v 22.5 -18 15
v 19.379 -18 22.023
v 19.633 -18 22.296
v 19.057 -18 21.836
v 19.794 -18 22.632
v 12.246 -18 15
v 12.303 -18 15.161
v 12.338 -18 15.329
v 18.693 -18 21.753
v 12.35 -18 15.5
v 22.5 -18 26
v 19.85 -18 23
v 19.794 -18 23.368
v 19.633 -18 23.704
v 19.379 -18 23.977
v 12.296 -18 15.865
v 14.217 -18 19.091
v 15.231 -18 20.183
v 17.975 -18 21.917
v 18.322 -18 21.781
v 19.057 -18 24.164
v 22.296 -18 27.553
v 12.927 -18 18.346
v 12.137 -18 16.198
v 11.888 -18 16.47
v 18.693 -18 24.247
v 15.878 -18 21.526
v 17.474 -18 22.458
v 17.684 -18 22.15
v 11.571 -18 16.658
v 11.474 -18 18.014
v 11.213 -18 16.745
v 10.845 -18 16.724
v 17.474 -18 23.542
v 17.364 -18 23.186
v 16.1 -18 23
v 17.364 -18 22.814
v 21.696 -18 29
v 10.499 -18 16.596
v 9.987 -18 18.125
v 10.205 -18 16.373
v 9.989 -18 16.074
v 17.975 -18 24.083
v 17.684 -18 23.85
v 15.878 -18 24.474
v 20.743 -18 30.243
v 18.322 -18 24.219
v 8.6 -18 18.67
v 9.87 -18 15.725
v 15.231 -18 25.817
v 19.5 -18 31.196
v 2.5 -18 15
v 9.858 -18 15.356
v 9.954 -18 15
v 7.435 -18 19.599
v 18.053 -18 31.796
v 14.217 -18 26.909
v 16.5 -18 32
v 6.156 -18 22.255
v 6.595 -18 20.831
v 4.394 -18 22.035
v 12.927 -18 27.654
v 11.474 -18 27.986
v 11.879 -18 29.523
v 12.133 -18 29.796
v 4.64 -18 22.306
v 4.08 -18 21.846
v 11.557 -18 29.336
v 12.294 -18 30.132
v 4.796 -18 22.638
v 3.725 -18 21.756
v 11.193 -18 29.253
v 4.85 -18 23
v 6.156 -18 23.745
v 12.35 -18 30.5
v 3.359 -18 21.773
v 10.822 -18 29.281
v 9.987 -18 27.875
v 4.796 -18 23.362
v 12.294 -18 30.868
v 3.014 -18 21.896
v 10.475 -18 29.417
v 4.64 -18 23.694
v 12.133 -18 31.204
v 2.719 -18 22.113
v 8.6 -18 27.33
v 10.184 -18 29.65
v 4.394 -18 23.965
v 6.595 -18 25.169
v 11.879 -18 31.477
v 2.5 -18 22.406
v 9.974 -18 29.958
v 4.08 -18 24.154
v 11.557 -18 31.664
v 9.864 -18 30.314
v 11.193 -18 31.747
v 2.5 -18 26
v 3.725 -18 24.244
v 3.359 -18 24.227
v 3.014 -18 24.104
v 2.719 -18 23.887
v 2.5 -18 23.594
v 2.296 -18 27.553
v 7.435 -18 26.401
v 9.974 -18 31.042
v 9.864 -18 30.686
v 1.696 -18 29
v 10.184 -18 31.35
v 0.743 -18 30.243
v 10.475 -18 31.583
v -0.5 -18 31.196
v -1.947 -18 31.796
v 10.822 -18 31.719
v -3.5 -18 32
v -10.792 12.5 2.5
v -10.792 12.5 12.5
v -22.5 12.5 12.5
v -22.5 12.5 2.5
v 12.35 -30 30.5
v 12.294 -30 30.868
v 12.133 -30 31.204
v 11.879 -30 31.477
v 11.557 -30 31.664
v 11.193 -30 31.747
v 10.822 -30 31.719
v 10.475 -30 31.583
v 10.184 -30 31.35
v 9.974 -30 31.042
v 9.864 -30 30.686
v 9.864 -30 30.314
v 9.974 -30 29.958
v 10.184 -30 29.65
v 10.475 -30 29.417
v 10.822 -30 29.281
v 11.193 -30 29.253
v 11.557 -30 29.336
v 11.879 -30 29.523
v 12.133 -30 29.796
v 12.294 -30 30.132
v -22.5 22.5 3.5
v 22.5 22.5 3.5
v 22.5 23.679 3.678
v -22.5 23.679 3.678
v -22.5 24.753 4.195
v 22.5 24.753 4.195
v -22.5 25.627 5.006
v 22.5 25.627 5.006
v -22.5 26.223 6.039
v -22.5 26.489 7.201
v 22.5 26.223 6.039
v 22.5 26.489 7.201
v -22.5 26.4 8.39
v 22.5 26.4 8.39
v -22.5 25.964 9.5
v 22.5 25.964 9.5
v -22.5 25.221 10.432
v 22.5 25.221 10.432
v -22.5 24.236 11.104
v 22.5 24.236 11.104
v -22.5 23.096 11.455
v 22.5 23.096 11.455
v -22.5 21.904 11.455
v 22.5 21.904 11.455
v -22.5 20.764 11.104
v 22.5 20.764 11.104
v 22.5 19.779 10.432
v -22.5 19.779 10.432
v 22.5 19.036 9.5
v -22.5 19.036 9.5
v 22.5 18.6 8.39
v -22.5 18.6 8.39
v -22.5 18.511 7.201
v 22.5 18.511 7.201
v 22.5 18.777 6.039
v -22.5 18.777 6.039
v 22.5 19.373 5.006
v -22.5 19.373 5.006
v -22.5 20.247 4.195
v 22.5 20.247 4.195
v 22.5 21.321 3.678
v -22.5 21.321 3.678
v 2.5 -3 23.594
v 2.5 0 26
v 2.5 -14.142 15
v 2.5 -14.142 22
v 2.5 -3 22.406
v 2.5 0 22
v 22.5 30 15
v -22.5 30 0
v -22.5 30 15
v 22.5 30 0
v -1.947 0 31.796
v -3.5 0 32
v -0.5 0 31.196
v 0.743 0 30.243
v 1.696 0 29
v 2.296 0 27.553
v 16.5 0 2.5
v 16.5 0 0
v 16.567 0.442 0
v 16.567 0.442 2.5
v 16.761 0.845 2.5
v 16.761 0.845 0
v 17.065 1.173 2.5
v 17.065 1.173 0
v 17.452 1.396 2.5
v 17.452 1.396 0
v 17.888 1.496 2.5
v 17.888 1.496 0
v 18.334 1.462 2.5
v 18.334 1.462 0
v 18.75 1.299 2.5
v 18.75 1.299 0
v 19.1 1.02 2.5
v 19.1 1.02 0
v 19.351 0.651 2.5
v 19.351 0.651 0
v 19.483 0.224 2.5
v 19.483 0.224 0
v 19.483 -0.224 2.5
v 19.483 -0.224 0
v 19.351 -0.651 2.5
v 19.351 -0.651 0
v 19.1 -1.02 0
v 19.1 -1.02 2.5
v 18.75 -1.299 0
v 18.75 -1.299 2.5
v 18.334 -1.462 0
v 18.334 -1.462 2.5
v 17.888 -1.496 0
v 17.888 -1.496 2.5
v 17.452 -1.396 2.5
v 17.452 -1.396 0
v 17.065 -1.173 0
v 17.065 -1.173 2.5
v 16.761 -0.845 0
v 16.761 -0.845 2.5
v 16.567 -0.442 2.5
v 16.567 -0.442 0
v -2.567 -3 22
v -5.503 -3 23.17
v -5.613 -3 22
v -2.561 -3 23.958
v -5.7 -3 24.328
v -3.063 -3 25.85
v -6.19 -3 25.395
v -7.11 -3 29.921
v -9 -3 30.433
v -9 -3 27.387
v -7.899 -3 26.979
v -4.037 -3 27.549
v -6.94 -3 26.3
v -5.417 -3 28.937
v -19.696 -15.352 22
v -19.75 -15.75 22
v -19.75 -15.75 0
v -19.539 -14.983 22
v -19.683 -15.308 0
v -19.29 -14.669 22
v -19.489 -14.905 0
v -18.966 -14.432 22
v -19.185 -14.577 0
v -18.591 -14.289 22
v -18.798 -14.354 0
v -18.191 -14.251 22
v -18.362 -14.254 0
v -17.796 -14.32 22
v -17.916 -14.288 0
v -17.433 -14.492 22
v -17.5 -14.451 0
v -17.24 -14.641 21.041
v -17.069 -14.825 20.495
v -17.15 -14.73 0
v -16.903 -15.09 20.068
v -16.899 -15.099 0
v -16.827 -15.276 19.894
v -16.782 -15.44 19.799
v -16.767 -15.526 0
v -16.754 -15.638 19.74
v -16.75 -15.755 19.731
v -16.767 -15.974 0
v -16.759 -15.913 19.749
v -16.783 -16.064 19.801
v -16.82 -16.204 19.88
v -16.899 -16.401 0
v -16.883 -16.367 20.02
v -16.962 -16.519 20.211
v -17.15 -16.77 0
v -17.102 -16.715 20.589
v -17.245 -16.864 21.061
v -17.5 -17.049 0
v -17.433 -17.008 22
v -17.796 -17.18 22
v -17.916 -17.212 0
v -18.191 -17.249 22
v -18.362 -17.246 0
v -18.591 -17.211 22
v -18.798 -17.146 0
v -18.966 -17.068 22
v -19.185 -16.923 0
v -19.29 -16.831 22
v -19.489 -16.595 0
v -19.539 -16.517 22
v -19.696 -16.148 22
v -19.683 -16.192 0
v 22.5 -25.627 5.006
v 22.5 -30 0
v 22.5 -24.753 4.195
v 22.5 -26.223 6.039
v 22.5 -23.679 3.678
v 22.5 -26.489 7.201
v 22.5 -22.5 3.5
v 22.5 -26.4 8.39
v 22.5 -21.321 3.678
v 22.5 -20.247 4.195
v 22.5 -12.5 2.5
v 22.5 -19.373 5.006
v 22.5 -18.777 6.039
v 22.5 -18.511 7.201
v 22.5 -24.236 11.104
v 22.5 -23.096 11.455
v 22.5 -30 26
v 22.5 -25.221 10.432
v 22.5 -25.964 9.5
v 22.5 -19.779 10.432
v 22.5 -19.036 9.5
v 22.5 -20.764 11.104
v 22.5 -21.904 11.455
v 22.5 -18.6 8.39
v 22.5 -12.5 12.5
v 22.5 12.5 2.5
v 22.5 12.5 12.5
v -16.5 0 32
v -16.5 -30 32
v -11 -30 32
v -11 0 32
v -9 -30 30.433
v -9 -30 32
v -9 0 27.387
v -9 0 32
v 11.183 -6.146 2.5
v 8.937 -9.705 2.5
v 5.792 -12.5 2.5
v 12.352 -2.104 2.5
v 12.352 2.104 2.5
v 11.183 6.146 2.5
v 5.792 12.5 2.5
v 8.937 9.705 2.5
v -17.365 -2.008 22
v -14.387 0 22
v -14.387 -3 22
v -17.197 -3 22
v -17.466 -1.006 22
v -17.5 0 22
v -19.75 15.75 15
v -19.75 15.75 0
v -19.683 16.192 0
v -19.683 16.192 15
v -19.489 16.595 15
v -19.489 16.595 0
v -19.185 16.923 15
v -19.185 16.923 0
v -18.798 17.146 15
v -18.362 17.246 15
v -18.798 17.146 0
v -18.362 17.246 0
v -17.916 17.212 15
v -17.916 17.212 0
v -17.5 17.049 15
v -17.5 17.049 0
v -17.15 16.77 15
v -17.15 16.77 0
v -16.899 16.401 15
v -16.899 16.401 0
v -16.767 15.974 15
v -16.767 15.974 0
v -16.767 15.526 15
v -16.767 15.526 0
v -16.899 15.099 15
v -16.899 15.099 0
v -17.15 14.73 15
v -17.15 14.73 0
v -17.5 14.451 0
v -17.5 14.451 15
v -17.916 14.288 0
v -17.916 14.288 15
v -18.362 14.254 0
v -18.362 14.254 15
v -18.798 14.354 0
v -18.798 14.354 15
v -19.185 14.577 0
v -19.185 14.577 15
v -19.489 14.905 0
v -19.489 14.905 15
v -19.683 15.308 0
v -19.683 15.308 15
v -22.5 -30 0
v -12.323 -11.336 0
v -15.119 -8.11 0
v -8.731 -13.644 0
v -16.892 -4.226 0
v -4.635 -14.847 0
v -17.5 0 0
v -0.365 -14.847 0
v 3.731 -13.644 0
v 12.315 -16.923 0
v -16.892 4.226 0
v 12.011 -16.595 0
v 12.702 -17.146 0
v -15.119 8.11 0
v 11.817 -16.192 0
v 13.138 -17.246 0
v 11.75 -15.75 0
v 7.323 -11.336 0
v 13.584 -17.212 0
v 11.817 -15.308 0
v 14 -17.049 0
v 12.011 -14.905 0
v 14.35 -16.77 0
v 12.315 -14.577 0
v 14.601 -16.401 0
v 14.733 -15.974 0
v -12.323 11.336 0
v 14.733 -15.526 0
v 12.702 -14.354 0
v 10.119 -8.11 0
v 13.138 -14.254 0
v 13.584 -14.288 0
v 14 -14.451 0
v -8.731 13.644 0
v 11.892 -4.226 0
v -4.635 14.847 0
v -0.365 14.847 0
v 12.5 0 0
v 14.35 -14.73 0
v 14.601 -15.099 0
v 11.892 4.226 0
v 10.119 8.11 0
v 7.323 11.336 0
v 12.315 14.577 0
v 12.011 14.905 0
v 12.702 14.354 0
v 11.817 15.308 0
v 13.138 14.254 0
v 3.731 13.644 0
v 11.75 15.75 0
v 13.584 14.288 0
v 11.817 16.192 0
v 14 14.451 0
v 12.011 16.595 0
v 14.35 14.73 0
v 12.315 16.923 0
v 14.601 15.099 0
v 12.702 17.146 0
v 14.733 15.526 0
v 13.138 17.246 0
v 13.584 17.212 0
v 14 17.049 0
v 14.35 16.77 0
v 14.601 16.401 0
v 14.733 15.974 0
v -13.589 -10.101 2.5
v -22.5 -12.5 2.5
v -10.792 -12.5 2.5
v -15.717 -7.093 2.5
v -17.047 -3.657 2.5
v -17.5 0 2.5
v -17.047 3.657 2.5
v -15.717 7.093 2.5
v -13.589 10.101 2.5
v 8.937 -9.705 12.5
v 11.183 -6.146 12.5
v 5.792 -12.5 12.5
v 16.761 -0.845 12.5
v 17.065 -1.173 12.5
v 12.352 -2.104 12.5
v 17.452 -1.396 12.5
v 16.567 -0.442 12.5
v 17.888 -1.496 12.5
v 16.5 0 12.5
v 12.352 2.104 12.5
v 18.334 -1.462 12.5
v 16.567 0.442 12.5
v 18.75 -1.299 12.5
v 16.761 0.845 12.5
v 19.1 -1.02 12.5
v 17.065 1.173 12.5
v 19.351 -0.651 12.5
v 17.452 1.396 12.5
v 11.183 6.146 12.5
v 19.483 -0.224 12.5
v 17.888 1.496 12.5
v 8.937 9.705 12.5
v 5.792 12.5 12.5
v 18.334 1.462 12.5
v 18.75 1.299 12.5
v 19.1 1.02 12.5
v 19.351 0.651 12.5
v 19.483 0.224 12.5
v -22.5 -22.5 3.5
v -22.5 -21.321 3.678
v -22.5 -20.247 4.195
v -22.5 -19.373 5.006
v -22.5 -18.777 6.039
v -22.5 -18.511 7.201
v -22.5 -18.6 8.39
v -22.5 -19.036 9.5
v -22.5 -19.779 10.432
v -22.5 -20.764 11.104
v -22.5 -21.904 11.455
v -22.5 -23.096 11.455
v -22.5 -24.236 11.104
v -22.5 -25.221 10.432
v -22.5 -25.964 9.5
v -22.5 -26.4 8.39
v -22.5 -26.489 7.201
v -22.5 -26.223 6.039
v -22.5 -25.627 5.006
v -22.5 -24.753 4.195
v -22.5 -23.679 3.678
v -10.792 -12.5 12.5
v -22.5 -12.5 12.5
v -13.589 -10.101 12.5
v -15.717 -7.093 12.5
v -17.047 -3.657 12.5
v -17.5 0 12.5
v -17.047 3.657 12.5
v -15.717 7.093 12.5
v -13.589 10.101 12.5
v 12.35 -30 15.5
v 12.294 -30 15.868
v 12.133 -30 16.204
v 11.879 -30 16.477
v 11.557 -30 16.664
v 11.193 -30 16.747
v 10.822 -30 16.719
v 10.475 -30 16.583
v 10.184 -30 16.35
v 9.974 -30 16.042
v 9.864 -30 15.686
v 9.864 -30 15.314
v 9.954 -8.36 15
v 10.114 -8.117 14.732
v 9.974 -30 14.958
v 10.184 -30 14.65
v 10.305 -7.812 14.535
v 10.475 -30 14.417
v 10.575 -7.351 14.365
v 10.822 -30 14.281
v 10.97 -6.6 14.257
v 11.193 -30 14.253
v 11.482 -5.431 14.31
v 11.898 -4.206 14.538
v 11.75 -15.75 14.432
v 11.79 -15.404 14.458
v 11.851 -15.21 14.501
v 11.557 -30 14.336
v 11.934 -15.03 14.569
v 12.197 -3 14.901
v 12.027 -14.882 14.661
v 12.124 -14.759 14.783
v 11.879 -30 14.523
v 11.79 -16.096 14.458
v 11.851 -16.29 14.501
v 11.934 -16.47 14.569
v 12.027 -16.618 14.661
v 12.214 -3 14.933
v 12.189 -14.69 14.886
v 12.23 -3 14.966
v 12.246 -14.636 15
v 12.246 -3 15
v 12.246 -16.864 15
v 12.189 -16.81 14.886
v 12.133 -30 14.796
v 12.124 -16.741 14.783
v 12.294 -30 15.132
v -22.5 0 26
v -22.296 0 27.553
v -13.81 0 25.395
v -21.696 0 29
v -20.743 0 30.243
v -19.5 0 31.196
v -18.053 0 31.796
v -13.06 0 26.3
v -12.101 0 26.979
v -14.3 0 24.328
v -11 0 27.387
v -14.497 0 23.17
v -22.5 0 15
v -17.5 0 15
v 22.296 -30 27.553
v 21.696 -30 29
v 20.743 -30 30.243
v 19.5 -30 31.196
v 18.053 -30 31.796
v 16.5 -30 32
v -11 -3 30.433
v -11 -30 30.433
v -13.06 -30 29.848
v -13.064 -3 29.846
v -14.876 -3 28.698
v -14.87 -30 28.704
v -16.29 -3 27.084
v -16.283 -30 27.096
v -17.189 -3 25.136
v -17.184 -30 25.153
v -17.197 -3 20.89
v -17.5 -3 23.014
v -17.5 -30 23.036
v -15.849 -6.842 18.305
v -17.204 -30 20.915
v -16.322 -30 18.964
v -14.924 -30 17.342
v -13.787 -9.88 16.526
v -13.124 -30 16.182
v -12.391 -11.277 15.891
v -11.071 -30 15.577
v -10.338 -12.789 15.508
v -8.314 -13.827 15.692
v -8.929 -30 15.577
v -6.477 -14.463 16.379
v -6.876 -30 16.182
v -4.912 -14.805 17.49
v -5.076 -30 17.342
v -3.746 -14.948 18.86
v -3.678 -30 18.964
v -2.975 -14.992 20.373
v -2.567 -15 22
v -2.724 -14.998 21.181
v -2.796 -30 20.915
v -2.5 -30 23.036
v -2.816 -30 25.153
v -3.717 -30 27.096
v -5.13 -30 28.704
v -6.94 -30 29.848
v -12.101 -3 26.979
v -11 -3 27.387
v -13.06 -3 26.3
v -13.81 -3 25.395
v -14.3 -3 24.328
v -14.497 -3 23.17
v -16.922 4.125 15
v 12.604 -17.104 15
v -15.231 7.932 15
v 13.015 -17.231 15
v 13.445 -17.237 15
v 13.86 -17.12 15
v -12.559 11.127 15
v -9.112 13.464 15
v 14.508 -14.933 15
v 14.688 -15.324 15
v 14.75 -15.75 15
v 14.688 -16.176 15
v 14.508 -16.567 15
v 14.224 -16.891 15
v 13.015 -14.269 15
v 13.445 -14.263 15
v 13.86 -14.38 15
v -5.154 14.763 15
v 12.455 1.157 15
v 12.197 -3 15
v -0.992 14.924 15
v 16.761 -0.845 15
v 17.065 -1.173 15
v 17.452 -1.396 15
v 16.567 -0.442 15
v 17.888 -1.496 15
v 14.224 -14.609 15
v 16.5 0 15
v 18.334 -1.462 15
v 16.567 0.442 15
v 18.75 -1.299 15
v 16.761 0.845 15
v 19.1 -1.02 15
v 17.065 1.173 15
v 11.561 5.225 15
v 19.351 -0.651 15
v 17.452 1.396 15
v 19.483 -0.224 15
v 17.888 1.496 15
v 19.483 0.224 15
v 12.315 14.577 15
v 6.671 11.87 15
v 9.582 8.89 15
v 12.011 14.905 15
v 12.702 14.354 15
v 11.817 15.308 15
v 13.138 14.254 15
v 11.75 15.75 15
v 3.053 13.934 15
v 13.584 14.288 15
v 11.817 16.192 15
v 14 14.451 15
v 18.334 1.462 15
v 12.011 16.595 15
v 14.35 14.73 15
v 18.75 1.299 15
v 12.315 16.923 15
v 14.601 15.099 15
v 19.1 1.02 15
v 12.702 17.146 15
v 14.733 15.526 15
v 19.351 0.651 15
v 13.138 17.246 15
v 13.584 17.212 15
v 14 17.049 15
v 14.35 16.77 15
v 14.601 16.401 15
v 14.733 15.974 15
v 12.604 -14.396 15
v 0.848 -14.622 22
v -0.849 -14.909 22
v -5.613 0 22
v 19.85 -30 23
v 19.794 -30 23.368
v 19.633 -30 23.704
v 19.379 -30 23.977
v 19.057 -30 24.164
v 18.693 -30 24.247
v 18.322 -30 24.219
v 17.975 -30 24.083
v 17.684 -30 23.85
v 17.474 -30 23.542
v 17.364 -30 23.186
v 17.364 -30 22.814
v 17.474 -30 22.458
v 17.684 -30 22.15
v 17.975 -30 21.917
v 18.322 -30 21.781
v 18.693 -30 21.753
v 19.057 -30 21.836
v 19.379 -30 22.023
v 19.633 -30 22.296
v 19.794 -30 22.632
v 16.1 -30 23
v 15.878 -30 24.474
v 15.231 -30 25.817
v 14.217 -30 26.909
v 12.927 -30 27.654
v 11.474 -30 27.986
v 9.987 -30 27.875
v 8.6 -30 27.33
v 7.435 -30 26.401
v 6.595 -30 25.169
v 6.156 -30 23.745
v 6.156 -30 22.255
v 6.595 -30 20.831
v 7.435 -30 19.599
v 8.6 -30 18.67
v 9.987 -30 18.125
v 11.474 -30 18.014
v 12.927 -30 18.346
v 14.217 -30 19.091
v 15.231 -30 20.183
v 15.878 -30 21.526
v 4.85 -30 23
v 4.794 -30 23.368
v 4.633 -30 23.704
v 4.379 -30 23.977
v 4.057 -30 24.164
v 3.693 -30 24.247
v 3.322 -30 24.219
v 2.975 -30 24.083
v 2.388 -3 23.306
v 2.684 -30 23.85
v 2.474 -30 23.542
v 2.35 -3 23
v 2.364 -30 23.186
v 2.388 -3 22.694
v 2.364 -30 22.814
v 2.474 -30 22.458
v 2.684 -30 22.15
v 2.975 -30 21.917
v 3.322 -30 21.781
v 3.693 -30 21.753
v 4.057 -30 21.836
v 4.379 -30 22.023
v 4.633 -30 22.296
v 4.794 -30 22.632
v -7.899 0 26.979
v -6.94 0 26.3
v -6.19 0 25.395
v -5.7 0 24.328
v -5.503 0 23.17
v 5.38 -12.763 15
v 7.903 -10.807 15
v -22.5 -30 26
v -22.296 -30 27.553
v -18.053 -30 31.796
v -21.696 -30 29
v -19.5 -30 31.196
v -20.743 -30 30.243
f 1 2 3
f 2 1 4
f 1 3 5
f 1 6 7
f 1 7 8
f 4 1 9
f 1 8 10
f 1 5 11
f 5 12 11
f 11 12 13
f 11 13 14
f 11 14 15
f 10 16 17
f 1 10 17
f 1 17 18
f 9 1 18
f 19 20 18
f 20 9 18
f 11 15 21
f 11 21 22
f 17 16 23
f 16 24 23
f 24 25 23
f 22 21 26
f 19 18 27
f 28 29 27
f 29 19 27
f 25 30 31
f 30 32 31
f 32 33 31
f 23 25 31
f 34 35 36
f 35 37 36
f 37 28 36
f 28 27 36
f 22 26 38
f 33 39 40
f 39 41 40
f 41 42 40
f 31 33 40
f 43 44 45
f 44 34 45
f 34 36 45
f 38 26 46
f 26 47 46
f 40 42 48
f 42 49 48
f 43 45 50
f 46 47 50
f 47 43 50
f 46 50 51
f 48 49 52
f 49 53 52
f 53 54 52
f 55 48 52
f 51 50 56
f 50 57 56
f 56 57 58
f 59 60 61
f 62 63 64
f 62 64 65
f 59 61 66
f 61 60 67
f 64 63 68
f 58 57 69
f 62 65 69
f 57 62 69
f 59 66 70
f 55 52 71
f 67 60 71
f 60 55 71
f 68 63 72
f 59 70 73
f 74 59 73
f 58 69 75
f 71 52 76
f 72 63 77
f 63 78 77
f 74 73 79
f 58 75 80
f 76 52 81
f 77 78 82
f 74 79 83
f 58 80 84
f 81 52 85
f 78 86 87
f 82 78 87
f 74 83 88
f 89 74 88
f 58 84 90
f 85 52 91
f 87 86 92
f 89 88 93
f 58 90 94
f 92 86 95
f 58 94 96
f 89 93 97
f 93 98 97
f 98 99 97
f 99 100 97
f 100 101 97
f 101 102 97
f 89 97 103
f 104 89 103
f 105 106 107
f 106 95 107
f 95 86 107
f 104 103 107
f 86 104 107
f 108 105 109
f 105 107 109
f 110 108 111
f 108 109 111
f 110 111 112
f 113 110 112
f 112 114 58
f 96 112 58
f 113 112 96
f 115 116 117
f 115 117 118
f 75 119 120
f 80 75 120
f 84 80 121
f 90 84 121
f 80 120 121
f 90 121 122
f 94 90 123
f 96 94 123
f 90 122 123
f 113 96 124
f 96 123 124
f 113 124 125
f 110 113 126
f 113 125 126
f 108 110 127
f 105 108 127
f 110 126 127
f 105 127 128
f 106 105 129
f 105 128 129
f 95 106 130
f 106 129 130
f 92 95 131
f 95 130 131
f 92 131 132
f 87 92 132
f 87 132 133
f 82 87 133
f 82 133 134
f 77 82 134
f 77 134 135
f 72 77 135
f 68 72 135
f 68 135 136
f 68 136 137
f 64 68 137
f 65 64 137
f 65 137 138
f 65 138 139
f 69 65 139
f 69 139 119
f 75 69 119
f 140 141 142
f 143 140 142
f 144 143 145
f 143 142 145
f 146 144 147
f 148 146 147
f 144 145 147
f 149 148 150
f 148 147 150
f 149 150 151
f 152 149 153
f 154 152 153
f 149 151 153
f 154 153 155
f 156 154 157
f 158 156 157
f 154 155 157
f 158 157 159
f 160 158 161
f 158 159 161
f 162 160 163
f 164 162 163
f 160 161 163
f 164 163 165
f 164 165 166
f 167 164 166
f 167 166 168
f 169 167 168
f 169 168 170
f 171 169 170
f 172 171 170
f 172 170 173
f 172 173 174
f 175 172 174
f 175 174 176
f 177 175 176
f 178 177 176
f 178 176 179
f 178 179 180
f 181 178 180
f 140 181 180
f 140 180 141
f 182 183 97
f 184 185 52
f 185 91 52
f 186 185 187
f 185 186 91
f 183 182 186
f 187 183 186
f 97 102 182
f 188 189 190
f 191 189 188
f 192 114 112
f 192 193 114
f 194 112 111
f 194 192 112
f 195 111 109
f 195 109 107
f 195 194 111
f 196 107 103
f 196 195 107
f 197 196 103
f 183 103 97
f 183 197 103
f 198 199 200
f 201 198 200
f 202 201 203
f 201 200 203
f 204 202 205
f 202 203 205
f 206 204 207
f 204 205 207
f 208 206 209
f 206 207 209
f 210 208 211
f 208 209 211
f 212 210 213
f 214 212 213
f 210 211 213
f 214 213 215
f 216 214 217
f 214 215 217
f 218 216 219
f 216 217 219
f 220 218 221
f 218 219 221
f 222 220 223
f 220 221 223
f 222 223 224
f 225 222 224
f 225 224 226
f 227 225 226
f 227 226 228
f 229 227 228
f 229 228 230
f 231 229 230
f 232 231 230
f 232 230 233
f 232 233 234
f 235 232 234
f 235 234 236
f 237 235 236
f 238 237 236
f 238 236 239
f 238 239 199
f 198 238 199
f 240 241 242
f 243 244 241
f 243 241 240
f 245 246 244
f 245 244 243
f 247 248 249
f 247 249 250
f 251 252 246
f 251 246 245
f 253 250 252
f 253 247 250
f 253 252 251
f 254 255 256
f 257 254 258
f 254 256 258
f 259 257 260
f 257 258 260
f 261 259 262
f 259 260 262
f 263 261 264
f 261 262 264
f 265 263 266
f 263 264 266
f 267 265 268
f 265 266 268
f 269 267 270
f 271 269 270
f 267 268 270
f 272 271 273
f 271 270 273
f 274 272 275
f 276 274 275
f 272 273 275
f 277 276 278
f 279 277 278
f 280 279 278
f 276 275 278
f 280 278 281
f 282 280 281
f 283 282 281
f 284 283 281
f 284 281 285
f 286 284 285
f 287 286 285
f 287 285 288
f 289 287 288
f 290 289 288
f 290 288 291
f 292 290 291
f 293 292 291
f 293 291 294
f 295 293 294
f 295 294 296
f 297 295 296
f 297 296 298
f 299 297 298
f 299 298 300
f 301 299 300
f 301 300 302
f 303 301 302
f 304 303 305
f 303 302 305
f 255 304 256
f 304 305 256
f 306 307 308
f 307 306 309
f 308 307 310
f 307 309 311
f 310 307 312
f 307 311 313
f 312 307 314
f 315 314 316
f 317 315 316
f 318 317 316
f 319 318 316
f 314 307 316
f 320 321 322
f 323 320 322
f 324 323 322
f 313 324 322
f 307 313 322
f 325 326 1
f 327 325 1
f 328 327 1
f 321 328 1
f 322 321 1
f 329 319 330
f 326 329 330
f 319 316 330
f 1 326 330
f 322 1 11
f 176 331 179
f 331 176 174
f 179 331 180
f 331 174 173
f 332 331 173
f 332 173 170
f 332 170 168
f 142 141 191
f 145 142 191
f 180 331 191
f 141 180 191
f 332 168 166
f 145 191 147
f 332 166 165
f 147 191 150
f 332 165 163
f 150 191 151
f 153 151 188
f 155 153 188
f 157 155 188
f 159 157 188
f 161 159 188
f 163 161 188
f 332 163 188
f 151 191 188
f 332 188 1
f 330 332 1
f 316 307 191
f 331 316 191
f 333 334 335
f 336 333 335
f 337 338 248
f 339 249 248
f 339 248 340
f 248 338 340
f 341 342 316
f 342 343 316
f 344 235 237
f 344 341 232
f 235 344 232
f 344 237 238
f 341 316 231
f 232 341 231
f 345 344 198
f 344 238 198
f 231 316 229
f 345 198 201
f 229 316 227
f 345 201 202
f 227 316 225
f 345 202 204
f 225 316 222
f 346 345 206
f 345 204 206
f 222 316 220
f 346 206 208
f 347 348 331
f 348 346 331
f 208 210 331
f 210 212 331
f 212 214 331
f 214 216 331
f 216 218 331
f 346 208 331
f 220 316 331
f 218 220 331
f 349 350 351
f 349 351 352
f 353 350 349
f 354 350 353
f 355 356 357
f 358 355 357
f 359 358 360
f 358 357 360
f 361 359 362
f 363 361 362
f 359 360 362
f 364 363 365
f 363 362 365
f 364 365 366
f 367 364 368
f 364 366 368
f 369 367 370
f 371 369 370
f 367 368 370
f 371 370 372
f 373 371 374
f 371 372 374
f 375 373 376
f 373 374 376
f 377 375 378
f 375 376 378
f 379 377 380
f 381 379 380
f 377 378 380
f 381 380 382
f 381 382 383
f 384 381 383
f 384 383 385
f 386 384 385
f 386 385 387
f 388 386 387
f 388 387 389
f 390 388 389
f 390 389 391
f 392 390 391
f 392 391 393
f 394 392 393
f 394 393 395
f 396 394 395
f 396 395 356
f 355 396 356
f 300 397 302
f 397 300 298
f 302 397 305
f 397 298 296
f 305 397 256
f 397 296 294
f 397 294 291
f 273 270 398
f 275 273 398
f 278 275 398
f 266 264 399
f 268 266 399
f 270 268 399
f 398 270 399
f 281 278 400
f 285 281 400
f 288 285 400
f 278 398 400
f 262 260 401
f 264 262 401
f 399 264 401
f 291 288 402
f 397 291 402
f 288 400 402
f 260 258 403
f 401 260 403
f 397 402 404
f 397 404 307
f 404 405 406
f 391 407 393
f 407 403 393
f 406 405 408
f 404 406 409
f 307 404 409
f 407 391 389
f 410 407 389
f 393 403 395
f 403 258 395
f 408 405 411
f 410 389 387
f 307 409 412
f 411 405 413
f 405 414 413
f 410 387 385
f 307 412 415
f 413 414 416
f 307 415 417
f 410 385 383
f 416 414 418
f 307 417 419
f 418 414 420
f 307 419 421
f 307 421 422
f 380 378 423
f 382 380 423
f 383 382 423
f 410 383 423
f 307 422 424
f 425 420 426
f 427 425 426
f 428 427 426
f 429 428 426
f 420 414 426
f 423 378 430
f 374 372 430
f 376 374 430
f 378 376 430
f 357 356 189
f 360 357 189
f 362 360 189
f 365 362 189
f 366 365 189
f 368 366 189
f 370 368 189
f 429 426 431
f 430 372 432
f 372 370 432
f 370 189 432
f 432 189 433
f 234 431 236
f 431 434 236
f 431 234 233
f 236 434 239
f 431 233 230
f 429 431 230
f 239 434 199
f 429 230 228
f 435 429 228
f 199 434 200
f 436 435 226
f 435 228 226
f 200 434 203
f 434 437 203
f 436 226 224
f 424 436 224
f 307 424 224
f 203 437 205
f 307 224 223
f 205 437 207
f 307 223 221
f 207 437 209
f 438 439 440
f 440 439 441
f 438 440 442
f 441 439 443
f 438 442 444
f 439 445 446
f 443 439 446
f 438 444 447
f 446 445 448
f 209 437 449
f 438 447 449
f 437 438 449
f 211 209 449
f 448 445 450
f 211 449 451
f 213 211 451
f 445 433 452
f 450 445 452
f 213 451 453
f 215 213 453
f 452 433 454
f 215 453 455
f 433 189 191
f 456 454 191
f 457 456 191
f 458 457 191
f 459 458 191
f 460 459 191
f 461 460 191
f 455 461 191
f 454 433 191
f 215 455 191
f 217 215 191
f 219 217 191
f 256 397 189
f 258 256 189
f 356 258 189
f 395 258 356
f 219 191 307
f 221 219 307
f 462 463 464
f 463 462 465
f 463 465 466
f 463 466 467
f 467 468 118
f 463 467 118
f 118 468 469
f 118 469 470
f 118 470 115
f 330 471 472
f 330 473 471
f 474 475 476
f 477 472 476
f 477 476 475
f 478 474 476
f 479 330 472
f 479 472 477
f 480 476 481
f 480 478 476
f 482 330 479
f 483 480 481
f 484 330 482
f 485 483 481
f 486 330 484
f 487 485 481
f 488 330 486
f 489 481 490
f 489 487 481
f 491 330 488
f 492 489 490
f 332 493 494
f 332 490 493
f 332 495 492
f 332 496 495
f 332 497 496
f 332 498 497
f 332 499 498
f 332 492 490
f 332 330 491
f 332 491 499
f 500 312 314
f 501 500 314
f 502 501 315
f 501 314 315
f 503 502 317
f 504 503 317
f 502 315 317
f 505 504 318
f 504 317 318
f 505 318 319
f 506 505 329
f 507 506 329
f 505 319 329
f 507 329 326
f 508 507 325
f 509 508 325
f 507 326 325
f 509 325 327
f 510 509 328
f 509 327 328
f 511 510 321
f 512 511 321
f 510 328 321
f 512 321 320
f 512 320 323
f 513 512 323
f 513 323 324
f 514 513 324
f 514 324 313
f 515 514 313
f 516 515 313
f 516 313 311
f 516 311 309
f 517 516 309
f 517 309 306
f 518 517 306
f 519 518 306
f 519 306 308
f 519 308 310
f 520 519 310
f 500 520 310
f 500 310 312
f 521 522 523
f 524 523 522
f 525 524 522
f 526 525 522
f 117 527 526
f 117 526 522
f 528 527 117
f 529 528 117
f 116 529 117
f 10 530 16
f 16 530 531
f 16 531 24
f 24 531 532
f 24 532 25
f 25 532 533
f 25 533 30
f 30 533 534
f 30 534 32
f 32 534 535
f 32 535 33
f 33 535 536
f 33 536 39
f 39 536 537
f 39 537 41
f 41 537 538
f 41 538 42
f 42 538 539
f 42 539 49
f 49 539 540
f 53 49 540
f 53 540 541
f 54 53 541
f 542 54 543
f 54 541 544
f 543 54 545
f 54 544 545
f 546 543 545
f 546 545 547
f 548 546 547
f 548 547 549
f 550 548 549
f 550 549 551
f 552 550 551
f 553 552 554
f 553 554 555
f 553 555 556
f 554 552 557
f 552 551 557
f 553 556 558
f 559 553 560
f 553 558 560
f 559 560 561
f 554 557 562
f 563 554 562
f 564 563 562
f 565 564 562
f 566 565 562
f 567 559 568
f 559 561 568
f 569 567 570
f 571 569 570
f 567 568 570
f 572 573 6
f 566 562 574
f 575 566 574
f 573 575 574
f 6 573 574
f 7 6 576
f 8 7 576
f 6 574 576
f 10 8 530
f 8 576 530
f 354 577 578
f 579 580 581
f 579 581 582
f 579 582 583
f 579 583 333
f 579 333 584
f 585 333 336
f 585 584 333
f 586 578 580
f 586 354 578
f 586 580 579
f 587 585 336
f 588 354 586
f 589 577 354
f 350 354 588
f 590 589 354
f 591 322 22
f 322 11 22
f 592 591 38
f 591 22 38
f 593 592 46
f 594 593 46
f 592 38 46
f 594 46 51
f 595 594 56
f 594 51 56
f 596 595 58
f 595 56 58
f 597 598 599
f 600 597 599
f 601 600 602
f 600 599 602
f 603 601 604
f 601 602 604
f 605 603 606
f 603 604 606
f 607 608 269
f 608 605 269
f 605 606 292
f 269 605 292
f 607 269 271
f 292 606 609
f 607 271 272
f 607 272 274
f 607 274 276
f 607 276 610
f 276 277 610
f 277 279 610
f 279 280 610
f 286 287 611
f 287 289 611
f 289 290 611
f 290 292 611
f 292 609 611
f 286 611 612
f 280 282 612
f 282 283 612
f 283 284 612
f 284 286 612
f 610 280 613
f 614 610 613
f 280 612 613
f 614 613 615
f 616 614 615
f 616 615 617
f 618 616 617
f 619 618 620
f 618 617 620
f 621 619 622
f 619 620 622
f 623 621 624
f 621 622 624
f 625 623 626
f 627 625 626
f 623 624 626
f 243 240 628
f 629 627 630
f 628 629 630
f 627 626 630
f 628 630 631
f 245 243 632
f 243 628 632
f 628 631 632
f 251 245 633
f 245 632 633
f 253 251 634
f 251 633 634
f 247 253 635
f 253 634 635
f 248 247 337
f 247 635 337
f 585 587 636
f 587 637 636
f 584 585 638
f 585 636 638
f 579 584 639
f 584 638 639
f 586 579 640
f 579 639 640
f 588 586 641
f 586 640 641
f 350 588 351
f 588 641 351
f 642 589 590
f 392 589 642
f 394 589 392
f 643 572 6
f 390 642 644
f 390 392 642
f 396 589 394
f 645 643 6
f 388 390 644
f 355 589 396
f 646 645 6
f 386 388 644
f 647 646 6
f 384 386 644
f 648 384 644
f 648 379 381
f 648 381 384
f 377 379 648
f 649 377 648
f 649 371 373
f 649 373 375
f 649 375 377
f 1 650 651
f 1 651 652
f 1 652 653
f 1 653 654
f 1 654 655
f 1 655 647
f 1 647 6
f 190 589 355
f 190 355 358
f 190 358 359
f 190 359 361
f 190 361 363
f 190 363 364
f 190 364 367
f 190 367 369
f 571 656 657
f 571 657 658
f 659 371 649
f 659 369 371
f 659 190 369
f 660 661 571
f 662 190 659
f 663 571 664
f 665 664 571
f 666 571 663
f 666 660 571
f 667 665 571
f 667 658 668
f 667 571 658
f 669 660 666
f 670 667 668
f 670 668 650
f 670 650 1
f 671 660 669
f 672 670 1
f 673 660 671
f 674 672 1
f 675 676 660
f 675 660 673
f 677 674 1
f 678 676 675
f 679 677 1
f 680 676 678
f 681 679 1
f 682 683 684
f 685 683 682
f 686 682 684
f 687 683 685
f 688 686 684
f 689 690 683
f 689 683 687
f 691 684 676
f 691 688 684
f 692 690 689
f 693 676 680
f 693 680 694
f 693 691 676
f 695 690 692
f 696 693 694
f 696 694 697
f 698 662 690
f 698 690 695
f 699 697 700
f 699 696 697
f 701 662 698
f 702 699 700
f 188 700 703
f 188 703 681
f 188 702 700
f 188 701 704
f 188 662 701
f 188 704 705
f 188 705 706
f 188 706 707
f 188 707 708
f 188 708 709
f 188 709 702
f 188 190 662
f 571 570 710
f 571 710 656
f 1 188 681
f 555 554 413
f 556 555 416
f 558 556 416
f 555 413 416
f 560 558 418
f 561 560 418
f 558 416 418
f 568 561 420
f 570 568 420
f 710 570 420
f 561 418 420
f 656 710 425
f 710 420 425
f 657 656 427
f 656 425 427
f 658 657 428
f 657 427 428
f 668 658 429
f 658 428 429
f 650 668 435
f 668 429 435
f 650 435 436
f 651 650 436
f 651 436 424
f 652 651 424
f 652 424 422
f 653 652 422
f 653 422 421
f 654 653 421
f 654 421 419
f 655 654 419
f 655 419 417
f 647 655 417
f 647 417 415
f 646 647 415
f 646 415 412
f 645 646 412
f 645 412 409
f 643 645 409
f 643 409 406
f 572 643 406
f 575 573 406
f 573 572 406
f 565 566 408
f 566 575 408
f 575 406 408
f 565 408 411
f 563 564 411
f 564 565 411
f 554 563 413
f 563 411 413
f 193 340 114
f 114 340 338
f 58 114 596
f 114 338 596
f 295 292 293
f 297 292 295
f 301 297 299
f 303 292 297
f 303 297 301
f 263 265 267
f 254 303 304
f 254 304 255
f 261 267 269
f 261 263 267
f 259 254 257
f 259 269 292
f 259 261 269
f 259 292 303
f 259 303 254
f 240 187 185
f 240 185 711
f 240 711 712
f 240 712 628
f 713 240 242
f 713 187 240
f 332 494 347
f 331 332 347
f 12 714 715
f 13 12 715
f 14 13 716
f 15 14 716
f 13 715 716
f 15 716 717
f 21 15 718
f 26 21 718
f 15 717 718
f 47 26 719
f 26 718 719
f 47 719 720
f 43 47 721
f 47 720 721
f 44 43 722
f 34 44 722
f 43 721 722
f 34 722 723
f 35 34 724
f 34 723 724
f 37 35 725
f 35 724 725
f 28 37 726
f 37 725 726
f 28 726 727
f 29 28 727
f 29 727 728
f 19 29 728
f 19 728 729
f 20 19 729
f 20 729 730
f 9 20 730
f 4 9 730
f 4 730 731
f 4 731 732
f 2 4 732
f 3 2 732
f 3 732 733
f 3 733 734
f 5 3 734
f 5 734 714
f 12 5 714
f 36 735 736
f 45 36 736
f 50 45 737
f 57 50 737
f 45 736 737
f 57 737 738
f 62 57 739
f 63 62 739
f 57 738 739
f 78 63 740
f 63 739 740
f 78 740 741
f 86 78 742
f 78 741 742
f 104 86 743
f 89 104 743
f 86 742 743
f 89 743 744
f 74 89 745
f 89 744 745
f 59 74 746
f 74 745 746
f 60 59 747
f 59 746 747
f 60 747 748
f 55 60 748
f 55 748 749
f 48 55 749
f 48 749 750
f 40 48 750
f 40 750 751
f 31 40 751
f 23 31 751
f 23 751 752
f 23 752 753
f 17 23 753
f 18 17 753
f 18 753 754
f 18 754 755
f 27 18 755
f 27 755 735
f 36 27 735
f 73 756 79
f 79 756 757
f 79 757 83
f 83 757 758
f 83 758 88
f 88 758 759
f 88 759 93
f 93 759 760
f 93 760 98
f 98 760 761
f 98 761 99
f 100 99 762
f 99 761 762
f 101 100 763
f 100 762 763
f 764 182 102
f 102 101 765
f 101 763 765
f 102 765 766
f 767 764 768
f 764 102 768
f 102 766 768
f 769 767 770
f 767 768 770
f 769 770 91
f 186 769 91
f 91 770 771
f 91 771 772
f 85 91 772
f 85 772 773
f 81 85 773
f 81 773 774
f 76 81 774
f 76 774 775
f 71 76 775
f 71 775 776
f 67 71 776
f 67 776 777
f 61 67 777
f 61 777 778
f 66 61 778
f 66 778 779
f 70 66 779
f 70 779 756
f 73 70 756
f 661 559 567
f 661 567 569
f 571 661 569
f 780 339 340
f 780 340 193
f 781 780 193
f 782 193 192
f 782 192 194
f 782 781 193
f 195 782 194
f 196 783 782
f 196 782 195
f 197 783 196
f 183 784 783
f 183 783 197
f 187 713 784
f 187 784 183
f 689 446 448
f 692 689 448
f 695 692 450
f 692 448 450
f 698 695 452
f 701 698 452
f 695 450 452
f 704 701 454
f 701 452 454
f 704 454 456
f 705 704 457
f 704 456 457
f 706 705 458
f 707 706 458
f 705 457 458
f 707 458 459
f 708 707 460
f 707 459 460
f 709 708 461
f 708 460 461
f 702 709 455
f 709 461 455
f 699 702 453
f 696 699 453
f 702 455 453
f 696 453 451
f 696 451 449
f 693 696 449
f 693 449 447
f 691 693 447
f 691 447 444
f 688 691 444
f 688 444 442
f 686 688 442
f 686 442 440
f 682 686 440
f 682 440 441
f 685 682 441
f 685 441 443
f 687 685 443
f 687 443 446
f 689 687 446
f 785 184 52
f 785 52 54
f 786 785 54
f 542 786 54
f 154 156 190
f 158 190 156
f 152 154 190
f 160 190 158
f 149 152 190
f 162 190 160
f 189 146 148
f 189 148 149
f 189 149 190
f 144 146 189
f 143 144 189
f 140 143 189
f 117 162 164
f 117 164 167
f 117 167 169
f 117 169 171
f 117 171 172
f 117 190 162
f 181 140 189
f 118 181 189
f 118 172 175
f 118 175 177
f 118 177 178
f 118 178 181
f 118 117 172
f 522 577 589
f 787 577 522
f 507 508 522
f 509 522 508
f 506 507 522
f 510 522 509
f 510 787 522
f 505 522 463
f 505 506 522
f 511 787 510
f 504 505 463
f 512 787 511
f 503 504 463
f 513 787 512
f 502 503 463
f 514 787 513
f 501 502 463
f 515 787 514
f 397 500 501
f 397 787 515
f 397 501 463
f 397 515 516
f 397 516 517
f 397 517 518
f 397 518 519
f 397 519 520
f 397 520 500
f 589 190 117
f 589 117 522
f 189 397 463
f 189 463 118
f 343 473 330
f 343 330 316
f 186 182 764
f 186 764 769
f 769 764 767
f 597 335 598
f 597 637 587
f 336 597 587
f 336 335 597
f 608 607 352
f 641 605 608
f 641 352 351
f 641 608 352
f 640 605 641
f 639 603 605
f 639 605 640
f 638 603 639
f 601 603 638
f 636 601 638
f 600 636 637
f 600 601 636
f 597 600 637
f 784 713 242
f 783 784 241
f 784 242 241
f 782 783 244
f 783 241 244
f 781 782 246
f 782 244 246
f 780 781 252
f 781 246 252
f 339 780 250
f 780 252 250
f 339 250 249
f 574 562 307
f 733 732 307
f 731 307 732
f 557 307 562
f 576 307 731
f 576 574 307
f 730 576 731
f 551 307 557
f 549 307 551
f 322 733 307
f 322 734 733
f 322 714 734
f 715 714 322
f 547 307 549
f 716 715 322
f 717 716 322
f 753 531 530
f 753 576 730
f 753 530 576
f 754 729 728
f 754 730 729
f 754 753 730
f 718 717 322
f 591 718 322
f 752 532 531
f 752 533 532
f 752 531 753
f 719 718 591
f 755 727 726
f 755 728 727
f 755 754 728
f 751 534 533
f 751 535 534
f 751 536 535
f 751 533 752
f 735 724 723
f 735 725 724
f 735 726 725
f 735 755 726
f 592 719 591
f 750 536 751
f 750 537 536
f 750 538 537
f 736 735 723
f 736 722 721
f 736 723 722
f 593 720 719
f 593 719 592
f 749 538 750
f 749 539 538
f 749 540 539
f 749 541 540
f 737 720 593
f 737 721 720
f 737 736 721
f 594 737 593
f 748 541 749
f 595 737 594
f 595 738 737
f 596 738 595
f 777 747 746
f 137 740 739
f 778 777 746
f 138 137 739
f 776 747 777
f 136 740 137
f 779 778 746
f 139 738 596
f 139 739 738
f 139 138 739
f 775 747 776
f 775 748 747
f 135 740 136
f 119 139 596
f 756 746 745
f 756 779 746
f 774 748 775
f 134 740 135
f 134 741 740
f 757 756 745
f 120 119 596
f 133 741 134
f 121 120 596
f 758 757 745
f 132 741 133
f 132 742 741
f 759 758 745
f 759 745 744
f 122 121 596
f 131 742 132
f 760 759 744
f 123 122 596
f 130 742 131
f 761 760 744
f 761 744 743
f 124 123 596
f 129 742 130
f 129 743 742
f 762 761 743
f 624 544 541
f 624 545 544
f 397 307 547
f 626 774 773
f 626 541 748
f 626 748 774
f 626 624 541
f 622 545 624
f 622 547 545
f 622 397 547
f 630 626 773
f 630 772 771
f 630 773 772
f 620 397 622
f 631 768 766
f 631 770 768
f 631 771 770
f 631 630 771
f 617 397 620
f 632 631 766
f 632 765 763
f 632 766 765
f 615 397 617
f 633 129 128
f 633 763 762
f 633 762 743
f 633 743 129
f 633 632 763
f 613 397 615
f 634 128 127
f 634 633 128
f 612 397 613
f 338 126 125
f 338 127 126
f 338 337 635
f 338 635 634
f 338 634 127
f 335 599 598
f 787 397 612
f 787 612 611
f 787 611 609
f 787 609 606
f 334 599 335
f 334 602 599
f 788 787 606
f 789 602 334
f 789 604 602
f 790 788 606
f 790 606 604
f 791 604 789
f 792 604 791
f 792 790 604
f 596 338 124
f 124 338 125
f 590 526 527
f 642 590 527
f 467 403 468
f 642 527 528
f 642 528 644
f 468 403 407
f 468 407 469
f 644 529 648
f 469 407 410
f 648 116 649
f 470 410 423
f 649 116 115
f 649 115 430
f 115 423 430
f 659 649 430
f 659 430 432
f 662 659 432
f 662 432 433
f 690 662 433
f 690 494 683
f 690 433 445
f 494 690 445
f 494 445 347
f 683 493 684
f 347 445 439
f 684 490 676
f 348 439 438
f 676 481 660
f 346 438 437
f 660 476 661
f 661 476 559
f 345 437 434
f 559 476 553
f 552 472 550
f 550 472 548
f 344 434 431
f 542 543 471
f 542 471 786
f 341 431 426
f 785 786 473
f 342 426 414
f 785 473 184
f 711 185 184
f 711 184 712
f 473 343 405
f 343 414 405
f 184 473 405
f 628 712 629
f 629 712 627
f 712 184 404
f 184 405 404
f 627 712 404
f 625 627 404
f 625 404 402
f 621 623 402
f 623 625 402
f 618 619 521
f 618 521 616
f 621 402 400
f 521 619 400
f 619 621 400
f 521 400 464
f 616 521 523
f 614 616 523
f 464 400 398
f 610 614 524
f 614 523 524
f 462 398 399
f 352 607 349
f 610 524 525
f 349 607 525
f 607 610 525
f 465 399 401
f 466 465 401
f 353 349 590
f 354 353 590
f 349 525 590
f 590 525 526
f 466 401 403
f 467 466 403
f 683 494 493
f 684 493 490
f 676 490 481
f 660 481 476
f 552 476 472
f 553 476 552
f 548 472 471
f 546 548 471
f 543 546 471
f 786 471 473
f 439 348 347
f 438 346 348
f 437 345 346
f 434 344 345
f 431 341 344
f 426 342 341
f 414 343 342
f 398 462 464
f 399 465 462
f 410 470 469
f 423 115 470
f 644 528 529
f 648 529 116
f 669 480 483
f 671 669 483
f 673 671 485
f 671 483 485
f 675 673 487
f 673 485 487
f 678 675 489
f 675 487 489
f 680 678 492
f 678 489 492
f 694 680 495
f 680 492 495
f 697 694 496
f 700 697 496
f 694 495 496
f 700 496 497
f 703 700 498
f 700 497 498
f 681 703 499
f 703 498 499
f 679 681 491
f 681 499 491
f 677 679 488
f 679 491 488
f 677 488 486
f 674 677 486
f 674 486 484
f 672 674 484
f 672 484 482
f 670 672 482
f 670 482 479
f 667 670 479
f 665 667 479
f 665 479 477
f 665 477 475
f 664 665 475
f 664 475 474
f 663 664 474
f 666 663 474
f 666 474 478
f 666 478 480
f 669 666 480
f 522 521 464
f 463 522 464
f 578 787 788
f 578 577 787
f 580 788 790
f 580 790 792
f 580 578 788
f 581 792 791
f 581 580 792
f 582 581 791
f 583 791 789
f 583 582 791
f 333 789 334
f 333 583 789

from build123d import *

# Parameters (mm, degrees)
SKETCH1_W           = 45
SKETCH1_H           = 60
BOSS_EXTRUDE1_DEPTH = 15
SKETCH2_R           = 4
SKETCH2_W           = 10
SKETCH2_H           = 25
CUT_EXTRUDE1_DEPTH  = 46
SKETCH3_W           = 17
SKETCH3_H           = 12
BOSS_EXTRUDE2_DEPTH = 45
SKETCH4_W           = 25
SKETCH4_H           = 17
BOSS_EXTRUDE3_DEPTH = 18
SKETCH5_W           = 2
SKETCH5_H           = 30
CUT_EXTRUDE2_DEPTH  = 5
SKETCH6_R           = 4.5
CUT_EXTRUDE3_DEPTH  = 61
SKETCH7_R           = 7.5
SKETCH7_R_2         = 5
SKETCH7_R_3         = 1.25
CUT_EXTRUDE4_DEPTH  = 27
SKETCH8_R           = 15
SKETCH8_R_2         = 1.5
CUT_EXTRUDE5_DEPTH  = 22
FILLET1_R           = 6
SKETCH9_R           = 1.5
CUT_EXTRUDE6_DEPTH  = 15


with BuildPart() as part:
    # Sketch1 → Boss-Extrude1 (new body)
    with BuildSketch(Plane.XY):
        Rectangle(SKETCH1_W, SKETCH1_H)
    extrude(amount=BOSS_EXTRUDE1_DEPTH)

    # Sketch2 → Cut-Extrude1 (cut, through all)
    with BuildSketch(Plane(origin=(22.5, 0, 0), x_dir=(0, 0, -1), z_dir=(1, 0, 0))):
        with Locations((-7.5, 22.5)):
            Circle(SKETCH2_R)
        with Locations((-7.5, -22.5)):
            Circle(SKETCH2_R)
        with Locations((-7.5, 0)):
            Rectangle(SKETCH2_W, SKETCH2_H)
    extrude(amount=-CUT_EXTRUDE1_DEPTH, mode=Mode.SUBTRACT)

    # Sketch3 → Boss-Extrude2 (add)
    with BuildSketch(Plane.ZY.offset(22.5)):
        with Locations((23.5, -24)):
            Rectangle(SKETCH3_W, SKETCH3_H)
    extrude(amount=-BOSS_EXTRUDE2_DEPTH)

    # Sketch4 → Boss-Extrude3 (add)
    with BuildSketch(Plane(origin=(0, -18, 0), x_dir=(1, 0, 0), z_dir=(0, 1, 0))):
        with Locations((-10, -23.5)):
            Rectangle(SKETCH4_W, SKETCH4_H)
    extrude(amount=BOSS_EXTRUDE3_DEPTH)

    # Sketch5 → Cut-Extrude2 (cut)
    with BuildSketch(Plane.XY.offset(32)):
        with Locations((-10, -15)):
            Rectangle(SKETCH5_W, SKETCH5_H)
    extrude(amount=-CUT_EXTRUDE2_DEPTH, mode=Mode.SUBTRACT)

    # Sketch6 → Cut-Extrude3 (cut, through all)
    with BuildSketch(Plane.XZ.offset(30)):
        with Locations((-10, 23)):
            Circle(SKETCH6_R)
    extrude(amount=-CUT_EXTRUDE3_DEPTH, mode=Mode.SUBTRACT)

    # Sketch7 → Cut-Extrude4 (cut)
    with BuildSketch(Plane.XZ.offset(30)):
        with Locations((-10, 23)):
            Circle(SKETCH7_R)
        with Locations((11.1, 23)):
            Circle(SKETCH7_R_2)
        with Locations((18.6, 23)):
            Circle(SKETCH7_R_3)
        with Locations((11.1, 30.5)):
            Circle(SKETCH7_R_3)
        with Locations((11.1, 15.5)):
            Circle(SKETCH7_R_3)
        with Locations((3.6, 23)):
            Circle(SKETCH7_R_3)
    extrude(amount=-CUT_EXTRUDE4_DEPTH, mode=Mode.SUBTRACT)

    # Sketch8 → Cut-Extrude5 (cut)
    with BuildSketch(Plane(origin=(0, 0, 0), x_dir=(-1, 0, 0), z_dir=(0, 0, -1))):
        with Locations((2.5, 0)):
            Circle(SKETCH8_R)
        with Locations((18.25, 15.75)):
            Circle(SKETCH8_R_2)
        with Locations((-13.25, 15.75)):
            Circle(SKETCH8_R_2)
        with Locations((-13.25, -15.75)):
            Circle(SKETCH8_R_2)
        with Locations((18.25, -15.75)):
            Circle(SKETCH8_R_2)
    extrude(amount=-CUT_EXTRUDE5_DEPTH, mode=Mode.SUBTRACT)

    # Fillet1
    fillet1_edges = [part.edges().sort_by_distance(p)[0] for p in [
        (-22.5, -15, 32),
        (22.5, -24, 32),
        (2.5, -9, 32),
    ]]
    fillet(fillet1_edges, radius=FILLET1_R)

    # Sketch9 → Cut-Extrude6 (cut)
    with BuildSketch(Plane(origin=(0, 0, 0), x_dir=(-1, 0, 0), z_dir=(0, 0, -1))):
        with Locations((-18, 0)):
            Circle(SKETCH9_R)
    extrude(amount=-CUT_EXTRUDE6_DEPTH, mode=Mode.SUBTRACT)


solid = part.part
